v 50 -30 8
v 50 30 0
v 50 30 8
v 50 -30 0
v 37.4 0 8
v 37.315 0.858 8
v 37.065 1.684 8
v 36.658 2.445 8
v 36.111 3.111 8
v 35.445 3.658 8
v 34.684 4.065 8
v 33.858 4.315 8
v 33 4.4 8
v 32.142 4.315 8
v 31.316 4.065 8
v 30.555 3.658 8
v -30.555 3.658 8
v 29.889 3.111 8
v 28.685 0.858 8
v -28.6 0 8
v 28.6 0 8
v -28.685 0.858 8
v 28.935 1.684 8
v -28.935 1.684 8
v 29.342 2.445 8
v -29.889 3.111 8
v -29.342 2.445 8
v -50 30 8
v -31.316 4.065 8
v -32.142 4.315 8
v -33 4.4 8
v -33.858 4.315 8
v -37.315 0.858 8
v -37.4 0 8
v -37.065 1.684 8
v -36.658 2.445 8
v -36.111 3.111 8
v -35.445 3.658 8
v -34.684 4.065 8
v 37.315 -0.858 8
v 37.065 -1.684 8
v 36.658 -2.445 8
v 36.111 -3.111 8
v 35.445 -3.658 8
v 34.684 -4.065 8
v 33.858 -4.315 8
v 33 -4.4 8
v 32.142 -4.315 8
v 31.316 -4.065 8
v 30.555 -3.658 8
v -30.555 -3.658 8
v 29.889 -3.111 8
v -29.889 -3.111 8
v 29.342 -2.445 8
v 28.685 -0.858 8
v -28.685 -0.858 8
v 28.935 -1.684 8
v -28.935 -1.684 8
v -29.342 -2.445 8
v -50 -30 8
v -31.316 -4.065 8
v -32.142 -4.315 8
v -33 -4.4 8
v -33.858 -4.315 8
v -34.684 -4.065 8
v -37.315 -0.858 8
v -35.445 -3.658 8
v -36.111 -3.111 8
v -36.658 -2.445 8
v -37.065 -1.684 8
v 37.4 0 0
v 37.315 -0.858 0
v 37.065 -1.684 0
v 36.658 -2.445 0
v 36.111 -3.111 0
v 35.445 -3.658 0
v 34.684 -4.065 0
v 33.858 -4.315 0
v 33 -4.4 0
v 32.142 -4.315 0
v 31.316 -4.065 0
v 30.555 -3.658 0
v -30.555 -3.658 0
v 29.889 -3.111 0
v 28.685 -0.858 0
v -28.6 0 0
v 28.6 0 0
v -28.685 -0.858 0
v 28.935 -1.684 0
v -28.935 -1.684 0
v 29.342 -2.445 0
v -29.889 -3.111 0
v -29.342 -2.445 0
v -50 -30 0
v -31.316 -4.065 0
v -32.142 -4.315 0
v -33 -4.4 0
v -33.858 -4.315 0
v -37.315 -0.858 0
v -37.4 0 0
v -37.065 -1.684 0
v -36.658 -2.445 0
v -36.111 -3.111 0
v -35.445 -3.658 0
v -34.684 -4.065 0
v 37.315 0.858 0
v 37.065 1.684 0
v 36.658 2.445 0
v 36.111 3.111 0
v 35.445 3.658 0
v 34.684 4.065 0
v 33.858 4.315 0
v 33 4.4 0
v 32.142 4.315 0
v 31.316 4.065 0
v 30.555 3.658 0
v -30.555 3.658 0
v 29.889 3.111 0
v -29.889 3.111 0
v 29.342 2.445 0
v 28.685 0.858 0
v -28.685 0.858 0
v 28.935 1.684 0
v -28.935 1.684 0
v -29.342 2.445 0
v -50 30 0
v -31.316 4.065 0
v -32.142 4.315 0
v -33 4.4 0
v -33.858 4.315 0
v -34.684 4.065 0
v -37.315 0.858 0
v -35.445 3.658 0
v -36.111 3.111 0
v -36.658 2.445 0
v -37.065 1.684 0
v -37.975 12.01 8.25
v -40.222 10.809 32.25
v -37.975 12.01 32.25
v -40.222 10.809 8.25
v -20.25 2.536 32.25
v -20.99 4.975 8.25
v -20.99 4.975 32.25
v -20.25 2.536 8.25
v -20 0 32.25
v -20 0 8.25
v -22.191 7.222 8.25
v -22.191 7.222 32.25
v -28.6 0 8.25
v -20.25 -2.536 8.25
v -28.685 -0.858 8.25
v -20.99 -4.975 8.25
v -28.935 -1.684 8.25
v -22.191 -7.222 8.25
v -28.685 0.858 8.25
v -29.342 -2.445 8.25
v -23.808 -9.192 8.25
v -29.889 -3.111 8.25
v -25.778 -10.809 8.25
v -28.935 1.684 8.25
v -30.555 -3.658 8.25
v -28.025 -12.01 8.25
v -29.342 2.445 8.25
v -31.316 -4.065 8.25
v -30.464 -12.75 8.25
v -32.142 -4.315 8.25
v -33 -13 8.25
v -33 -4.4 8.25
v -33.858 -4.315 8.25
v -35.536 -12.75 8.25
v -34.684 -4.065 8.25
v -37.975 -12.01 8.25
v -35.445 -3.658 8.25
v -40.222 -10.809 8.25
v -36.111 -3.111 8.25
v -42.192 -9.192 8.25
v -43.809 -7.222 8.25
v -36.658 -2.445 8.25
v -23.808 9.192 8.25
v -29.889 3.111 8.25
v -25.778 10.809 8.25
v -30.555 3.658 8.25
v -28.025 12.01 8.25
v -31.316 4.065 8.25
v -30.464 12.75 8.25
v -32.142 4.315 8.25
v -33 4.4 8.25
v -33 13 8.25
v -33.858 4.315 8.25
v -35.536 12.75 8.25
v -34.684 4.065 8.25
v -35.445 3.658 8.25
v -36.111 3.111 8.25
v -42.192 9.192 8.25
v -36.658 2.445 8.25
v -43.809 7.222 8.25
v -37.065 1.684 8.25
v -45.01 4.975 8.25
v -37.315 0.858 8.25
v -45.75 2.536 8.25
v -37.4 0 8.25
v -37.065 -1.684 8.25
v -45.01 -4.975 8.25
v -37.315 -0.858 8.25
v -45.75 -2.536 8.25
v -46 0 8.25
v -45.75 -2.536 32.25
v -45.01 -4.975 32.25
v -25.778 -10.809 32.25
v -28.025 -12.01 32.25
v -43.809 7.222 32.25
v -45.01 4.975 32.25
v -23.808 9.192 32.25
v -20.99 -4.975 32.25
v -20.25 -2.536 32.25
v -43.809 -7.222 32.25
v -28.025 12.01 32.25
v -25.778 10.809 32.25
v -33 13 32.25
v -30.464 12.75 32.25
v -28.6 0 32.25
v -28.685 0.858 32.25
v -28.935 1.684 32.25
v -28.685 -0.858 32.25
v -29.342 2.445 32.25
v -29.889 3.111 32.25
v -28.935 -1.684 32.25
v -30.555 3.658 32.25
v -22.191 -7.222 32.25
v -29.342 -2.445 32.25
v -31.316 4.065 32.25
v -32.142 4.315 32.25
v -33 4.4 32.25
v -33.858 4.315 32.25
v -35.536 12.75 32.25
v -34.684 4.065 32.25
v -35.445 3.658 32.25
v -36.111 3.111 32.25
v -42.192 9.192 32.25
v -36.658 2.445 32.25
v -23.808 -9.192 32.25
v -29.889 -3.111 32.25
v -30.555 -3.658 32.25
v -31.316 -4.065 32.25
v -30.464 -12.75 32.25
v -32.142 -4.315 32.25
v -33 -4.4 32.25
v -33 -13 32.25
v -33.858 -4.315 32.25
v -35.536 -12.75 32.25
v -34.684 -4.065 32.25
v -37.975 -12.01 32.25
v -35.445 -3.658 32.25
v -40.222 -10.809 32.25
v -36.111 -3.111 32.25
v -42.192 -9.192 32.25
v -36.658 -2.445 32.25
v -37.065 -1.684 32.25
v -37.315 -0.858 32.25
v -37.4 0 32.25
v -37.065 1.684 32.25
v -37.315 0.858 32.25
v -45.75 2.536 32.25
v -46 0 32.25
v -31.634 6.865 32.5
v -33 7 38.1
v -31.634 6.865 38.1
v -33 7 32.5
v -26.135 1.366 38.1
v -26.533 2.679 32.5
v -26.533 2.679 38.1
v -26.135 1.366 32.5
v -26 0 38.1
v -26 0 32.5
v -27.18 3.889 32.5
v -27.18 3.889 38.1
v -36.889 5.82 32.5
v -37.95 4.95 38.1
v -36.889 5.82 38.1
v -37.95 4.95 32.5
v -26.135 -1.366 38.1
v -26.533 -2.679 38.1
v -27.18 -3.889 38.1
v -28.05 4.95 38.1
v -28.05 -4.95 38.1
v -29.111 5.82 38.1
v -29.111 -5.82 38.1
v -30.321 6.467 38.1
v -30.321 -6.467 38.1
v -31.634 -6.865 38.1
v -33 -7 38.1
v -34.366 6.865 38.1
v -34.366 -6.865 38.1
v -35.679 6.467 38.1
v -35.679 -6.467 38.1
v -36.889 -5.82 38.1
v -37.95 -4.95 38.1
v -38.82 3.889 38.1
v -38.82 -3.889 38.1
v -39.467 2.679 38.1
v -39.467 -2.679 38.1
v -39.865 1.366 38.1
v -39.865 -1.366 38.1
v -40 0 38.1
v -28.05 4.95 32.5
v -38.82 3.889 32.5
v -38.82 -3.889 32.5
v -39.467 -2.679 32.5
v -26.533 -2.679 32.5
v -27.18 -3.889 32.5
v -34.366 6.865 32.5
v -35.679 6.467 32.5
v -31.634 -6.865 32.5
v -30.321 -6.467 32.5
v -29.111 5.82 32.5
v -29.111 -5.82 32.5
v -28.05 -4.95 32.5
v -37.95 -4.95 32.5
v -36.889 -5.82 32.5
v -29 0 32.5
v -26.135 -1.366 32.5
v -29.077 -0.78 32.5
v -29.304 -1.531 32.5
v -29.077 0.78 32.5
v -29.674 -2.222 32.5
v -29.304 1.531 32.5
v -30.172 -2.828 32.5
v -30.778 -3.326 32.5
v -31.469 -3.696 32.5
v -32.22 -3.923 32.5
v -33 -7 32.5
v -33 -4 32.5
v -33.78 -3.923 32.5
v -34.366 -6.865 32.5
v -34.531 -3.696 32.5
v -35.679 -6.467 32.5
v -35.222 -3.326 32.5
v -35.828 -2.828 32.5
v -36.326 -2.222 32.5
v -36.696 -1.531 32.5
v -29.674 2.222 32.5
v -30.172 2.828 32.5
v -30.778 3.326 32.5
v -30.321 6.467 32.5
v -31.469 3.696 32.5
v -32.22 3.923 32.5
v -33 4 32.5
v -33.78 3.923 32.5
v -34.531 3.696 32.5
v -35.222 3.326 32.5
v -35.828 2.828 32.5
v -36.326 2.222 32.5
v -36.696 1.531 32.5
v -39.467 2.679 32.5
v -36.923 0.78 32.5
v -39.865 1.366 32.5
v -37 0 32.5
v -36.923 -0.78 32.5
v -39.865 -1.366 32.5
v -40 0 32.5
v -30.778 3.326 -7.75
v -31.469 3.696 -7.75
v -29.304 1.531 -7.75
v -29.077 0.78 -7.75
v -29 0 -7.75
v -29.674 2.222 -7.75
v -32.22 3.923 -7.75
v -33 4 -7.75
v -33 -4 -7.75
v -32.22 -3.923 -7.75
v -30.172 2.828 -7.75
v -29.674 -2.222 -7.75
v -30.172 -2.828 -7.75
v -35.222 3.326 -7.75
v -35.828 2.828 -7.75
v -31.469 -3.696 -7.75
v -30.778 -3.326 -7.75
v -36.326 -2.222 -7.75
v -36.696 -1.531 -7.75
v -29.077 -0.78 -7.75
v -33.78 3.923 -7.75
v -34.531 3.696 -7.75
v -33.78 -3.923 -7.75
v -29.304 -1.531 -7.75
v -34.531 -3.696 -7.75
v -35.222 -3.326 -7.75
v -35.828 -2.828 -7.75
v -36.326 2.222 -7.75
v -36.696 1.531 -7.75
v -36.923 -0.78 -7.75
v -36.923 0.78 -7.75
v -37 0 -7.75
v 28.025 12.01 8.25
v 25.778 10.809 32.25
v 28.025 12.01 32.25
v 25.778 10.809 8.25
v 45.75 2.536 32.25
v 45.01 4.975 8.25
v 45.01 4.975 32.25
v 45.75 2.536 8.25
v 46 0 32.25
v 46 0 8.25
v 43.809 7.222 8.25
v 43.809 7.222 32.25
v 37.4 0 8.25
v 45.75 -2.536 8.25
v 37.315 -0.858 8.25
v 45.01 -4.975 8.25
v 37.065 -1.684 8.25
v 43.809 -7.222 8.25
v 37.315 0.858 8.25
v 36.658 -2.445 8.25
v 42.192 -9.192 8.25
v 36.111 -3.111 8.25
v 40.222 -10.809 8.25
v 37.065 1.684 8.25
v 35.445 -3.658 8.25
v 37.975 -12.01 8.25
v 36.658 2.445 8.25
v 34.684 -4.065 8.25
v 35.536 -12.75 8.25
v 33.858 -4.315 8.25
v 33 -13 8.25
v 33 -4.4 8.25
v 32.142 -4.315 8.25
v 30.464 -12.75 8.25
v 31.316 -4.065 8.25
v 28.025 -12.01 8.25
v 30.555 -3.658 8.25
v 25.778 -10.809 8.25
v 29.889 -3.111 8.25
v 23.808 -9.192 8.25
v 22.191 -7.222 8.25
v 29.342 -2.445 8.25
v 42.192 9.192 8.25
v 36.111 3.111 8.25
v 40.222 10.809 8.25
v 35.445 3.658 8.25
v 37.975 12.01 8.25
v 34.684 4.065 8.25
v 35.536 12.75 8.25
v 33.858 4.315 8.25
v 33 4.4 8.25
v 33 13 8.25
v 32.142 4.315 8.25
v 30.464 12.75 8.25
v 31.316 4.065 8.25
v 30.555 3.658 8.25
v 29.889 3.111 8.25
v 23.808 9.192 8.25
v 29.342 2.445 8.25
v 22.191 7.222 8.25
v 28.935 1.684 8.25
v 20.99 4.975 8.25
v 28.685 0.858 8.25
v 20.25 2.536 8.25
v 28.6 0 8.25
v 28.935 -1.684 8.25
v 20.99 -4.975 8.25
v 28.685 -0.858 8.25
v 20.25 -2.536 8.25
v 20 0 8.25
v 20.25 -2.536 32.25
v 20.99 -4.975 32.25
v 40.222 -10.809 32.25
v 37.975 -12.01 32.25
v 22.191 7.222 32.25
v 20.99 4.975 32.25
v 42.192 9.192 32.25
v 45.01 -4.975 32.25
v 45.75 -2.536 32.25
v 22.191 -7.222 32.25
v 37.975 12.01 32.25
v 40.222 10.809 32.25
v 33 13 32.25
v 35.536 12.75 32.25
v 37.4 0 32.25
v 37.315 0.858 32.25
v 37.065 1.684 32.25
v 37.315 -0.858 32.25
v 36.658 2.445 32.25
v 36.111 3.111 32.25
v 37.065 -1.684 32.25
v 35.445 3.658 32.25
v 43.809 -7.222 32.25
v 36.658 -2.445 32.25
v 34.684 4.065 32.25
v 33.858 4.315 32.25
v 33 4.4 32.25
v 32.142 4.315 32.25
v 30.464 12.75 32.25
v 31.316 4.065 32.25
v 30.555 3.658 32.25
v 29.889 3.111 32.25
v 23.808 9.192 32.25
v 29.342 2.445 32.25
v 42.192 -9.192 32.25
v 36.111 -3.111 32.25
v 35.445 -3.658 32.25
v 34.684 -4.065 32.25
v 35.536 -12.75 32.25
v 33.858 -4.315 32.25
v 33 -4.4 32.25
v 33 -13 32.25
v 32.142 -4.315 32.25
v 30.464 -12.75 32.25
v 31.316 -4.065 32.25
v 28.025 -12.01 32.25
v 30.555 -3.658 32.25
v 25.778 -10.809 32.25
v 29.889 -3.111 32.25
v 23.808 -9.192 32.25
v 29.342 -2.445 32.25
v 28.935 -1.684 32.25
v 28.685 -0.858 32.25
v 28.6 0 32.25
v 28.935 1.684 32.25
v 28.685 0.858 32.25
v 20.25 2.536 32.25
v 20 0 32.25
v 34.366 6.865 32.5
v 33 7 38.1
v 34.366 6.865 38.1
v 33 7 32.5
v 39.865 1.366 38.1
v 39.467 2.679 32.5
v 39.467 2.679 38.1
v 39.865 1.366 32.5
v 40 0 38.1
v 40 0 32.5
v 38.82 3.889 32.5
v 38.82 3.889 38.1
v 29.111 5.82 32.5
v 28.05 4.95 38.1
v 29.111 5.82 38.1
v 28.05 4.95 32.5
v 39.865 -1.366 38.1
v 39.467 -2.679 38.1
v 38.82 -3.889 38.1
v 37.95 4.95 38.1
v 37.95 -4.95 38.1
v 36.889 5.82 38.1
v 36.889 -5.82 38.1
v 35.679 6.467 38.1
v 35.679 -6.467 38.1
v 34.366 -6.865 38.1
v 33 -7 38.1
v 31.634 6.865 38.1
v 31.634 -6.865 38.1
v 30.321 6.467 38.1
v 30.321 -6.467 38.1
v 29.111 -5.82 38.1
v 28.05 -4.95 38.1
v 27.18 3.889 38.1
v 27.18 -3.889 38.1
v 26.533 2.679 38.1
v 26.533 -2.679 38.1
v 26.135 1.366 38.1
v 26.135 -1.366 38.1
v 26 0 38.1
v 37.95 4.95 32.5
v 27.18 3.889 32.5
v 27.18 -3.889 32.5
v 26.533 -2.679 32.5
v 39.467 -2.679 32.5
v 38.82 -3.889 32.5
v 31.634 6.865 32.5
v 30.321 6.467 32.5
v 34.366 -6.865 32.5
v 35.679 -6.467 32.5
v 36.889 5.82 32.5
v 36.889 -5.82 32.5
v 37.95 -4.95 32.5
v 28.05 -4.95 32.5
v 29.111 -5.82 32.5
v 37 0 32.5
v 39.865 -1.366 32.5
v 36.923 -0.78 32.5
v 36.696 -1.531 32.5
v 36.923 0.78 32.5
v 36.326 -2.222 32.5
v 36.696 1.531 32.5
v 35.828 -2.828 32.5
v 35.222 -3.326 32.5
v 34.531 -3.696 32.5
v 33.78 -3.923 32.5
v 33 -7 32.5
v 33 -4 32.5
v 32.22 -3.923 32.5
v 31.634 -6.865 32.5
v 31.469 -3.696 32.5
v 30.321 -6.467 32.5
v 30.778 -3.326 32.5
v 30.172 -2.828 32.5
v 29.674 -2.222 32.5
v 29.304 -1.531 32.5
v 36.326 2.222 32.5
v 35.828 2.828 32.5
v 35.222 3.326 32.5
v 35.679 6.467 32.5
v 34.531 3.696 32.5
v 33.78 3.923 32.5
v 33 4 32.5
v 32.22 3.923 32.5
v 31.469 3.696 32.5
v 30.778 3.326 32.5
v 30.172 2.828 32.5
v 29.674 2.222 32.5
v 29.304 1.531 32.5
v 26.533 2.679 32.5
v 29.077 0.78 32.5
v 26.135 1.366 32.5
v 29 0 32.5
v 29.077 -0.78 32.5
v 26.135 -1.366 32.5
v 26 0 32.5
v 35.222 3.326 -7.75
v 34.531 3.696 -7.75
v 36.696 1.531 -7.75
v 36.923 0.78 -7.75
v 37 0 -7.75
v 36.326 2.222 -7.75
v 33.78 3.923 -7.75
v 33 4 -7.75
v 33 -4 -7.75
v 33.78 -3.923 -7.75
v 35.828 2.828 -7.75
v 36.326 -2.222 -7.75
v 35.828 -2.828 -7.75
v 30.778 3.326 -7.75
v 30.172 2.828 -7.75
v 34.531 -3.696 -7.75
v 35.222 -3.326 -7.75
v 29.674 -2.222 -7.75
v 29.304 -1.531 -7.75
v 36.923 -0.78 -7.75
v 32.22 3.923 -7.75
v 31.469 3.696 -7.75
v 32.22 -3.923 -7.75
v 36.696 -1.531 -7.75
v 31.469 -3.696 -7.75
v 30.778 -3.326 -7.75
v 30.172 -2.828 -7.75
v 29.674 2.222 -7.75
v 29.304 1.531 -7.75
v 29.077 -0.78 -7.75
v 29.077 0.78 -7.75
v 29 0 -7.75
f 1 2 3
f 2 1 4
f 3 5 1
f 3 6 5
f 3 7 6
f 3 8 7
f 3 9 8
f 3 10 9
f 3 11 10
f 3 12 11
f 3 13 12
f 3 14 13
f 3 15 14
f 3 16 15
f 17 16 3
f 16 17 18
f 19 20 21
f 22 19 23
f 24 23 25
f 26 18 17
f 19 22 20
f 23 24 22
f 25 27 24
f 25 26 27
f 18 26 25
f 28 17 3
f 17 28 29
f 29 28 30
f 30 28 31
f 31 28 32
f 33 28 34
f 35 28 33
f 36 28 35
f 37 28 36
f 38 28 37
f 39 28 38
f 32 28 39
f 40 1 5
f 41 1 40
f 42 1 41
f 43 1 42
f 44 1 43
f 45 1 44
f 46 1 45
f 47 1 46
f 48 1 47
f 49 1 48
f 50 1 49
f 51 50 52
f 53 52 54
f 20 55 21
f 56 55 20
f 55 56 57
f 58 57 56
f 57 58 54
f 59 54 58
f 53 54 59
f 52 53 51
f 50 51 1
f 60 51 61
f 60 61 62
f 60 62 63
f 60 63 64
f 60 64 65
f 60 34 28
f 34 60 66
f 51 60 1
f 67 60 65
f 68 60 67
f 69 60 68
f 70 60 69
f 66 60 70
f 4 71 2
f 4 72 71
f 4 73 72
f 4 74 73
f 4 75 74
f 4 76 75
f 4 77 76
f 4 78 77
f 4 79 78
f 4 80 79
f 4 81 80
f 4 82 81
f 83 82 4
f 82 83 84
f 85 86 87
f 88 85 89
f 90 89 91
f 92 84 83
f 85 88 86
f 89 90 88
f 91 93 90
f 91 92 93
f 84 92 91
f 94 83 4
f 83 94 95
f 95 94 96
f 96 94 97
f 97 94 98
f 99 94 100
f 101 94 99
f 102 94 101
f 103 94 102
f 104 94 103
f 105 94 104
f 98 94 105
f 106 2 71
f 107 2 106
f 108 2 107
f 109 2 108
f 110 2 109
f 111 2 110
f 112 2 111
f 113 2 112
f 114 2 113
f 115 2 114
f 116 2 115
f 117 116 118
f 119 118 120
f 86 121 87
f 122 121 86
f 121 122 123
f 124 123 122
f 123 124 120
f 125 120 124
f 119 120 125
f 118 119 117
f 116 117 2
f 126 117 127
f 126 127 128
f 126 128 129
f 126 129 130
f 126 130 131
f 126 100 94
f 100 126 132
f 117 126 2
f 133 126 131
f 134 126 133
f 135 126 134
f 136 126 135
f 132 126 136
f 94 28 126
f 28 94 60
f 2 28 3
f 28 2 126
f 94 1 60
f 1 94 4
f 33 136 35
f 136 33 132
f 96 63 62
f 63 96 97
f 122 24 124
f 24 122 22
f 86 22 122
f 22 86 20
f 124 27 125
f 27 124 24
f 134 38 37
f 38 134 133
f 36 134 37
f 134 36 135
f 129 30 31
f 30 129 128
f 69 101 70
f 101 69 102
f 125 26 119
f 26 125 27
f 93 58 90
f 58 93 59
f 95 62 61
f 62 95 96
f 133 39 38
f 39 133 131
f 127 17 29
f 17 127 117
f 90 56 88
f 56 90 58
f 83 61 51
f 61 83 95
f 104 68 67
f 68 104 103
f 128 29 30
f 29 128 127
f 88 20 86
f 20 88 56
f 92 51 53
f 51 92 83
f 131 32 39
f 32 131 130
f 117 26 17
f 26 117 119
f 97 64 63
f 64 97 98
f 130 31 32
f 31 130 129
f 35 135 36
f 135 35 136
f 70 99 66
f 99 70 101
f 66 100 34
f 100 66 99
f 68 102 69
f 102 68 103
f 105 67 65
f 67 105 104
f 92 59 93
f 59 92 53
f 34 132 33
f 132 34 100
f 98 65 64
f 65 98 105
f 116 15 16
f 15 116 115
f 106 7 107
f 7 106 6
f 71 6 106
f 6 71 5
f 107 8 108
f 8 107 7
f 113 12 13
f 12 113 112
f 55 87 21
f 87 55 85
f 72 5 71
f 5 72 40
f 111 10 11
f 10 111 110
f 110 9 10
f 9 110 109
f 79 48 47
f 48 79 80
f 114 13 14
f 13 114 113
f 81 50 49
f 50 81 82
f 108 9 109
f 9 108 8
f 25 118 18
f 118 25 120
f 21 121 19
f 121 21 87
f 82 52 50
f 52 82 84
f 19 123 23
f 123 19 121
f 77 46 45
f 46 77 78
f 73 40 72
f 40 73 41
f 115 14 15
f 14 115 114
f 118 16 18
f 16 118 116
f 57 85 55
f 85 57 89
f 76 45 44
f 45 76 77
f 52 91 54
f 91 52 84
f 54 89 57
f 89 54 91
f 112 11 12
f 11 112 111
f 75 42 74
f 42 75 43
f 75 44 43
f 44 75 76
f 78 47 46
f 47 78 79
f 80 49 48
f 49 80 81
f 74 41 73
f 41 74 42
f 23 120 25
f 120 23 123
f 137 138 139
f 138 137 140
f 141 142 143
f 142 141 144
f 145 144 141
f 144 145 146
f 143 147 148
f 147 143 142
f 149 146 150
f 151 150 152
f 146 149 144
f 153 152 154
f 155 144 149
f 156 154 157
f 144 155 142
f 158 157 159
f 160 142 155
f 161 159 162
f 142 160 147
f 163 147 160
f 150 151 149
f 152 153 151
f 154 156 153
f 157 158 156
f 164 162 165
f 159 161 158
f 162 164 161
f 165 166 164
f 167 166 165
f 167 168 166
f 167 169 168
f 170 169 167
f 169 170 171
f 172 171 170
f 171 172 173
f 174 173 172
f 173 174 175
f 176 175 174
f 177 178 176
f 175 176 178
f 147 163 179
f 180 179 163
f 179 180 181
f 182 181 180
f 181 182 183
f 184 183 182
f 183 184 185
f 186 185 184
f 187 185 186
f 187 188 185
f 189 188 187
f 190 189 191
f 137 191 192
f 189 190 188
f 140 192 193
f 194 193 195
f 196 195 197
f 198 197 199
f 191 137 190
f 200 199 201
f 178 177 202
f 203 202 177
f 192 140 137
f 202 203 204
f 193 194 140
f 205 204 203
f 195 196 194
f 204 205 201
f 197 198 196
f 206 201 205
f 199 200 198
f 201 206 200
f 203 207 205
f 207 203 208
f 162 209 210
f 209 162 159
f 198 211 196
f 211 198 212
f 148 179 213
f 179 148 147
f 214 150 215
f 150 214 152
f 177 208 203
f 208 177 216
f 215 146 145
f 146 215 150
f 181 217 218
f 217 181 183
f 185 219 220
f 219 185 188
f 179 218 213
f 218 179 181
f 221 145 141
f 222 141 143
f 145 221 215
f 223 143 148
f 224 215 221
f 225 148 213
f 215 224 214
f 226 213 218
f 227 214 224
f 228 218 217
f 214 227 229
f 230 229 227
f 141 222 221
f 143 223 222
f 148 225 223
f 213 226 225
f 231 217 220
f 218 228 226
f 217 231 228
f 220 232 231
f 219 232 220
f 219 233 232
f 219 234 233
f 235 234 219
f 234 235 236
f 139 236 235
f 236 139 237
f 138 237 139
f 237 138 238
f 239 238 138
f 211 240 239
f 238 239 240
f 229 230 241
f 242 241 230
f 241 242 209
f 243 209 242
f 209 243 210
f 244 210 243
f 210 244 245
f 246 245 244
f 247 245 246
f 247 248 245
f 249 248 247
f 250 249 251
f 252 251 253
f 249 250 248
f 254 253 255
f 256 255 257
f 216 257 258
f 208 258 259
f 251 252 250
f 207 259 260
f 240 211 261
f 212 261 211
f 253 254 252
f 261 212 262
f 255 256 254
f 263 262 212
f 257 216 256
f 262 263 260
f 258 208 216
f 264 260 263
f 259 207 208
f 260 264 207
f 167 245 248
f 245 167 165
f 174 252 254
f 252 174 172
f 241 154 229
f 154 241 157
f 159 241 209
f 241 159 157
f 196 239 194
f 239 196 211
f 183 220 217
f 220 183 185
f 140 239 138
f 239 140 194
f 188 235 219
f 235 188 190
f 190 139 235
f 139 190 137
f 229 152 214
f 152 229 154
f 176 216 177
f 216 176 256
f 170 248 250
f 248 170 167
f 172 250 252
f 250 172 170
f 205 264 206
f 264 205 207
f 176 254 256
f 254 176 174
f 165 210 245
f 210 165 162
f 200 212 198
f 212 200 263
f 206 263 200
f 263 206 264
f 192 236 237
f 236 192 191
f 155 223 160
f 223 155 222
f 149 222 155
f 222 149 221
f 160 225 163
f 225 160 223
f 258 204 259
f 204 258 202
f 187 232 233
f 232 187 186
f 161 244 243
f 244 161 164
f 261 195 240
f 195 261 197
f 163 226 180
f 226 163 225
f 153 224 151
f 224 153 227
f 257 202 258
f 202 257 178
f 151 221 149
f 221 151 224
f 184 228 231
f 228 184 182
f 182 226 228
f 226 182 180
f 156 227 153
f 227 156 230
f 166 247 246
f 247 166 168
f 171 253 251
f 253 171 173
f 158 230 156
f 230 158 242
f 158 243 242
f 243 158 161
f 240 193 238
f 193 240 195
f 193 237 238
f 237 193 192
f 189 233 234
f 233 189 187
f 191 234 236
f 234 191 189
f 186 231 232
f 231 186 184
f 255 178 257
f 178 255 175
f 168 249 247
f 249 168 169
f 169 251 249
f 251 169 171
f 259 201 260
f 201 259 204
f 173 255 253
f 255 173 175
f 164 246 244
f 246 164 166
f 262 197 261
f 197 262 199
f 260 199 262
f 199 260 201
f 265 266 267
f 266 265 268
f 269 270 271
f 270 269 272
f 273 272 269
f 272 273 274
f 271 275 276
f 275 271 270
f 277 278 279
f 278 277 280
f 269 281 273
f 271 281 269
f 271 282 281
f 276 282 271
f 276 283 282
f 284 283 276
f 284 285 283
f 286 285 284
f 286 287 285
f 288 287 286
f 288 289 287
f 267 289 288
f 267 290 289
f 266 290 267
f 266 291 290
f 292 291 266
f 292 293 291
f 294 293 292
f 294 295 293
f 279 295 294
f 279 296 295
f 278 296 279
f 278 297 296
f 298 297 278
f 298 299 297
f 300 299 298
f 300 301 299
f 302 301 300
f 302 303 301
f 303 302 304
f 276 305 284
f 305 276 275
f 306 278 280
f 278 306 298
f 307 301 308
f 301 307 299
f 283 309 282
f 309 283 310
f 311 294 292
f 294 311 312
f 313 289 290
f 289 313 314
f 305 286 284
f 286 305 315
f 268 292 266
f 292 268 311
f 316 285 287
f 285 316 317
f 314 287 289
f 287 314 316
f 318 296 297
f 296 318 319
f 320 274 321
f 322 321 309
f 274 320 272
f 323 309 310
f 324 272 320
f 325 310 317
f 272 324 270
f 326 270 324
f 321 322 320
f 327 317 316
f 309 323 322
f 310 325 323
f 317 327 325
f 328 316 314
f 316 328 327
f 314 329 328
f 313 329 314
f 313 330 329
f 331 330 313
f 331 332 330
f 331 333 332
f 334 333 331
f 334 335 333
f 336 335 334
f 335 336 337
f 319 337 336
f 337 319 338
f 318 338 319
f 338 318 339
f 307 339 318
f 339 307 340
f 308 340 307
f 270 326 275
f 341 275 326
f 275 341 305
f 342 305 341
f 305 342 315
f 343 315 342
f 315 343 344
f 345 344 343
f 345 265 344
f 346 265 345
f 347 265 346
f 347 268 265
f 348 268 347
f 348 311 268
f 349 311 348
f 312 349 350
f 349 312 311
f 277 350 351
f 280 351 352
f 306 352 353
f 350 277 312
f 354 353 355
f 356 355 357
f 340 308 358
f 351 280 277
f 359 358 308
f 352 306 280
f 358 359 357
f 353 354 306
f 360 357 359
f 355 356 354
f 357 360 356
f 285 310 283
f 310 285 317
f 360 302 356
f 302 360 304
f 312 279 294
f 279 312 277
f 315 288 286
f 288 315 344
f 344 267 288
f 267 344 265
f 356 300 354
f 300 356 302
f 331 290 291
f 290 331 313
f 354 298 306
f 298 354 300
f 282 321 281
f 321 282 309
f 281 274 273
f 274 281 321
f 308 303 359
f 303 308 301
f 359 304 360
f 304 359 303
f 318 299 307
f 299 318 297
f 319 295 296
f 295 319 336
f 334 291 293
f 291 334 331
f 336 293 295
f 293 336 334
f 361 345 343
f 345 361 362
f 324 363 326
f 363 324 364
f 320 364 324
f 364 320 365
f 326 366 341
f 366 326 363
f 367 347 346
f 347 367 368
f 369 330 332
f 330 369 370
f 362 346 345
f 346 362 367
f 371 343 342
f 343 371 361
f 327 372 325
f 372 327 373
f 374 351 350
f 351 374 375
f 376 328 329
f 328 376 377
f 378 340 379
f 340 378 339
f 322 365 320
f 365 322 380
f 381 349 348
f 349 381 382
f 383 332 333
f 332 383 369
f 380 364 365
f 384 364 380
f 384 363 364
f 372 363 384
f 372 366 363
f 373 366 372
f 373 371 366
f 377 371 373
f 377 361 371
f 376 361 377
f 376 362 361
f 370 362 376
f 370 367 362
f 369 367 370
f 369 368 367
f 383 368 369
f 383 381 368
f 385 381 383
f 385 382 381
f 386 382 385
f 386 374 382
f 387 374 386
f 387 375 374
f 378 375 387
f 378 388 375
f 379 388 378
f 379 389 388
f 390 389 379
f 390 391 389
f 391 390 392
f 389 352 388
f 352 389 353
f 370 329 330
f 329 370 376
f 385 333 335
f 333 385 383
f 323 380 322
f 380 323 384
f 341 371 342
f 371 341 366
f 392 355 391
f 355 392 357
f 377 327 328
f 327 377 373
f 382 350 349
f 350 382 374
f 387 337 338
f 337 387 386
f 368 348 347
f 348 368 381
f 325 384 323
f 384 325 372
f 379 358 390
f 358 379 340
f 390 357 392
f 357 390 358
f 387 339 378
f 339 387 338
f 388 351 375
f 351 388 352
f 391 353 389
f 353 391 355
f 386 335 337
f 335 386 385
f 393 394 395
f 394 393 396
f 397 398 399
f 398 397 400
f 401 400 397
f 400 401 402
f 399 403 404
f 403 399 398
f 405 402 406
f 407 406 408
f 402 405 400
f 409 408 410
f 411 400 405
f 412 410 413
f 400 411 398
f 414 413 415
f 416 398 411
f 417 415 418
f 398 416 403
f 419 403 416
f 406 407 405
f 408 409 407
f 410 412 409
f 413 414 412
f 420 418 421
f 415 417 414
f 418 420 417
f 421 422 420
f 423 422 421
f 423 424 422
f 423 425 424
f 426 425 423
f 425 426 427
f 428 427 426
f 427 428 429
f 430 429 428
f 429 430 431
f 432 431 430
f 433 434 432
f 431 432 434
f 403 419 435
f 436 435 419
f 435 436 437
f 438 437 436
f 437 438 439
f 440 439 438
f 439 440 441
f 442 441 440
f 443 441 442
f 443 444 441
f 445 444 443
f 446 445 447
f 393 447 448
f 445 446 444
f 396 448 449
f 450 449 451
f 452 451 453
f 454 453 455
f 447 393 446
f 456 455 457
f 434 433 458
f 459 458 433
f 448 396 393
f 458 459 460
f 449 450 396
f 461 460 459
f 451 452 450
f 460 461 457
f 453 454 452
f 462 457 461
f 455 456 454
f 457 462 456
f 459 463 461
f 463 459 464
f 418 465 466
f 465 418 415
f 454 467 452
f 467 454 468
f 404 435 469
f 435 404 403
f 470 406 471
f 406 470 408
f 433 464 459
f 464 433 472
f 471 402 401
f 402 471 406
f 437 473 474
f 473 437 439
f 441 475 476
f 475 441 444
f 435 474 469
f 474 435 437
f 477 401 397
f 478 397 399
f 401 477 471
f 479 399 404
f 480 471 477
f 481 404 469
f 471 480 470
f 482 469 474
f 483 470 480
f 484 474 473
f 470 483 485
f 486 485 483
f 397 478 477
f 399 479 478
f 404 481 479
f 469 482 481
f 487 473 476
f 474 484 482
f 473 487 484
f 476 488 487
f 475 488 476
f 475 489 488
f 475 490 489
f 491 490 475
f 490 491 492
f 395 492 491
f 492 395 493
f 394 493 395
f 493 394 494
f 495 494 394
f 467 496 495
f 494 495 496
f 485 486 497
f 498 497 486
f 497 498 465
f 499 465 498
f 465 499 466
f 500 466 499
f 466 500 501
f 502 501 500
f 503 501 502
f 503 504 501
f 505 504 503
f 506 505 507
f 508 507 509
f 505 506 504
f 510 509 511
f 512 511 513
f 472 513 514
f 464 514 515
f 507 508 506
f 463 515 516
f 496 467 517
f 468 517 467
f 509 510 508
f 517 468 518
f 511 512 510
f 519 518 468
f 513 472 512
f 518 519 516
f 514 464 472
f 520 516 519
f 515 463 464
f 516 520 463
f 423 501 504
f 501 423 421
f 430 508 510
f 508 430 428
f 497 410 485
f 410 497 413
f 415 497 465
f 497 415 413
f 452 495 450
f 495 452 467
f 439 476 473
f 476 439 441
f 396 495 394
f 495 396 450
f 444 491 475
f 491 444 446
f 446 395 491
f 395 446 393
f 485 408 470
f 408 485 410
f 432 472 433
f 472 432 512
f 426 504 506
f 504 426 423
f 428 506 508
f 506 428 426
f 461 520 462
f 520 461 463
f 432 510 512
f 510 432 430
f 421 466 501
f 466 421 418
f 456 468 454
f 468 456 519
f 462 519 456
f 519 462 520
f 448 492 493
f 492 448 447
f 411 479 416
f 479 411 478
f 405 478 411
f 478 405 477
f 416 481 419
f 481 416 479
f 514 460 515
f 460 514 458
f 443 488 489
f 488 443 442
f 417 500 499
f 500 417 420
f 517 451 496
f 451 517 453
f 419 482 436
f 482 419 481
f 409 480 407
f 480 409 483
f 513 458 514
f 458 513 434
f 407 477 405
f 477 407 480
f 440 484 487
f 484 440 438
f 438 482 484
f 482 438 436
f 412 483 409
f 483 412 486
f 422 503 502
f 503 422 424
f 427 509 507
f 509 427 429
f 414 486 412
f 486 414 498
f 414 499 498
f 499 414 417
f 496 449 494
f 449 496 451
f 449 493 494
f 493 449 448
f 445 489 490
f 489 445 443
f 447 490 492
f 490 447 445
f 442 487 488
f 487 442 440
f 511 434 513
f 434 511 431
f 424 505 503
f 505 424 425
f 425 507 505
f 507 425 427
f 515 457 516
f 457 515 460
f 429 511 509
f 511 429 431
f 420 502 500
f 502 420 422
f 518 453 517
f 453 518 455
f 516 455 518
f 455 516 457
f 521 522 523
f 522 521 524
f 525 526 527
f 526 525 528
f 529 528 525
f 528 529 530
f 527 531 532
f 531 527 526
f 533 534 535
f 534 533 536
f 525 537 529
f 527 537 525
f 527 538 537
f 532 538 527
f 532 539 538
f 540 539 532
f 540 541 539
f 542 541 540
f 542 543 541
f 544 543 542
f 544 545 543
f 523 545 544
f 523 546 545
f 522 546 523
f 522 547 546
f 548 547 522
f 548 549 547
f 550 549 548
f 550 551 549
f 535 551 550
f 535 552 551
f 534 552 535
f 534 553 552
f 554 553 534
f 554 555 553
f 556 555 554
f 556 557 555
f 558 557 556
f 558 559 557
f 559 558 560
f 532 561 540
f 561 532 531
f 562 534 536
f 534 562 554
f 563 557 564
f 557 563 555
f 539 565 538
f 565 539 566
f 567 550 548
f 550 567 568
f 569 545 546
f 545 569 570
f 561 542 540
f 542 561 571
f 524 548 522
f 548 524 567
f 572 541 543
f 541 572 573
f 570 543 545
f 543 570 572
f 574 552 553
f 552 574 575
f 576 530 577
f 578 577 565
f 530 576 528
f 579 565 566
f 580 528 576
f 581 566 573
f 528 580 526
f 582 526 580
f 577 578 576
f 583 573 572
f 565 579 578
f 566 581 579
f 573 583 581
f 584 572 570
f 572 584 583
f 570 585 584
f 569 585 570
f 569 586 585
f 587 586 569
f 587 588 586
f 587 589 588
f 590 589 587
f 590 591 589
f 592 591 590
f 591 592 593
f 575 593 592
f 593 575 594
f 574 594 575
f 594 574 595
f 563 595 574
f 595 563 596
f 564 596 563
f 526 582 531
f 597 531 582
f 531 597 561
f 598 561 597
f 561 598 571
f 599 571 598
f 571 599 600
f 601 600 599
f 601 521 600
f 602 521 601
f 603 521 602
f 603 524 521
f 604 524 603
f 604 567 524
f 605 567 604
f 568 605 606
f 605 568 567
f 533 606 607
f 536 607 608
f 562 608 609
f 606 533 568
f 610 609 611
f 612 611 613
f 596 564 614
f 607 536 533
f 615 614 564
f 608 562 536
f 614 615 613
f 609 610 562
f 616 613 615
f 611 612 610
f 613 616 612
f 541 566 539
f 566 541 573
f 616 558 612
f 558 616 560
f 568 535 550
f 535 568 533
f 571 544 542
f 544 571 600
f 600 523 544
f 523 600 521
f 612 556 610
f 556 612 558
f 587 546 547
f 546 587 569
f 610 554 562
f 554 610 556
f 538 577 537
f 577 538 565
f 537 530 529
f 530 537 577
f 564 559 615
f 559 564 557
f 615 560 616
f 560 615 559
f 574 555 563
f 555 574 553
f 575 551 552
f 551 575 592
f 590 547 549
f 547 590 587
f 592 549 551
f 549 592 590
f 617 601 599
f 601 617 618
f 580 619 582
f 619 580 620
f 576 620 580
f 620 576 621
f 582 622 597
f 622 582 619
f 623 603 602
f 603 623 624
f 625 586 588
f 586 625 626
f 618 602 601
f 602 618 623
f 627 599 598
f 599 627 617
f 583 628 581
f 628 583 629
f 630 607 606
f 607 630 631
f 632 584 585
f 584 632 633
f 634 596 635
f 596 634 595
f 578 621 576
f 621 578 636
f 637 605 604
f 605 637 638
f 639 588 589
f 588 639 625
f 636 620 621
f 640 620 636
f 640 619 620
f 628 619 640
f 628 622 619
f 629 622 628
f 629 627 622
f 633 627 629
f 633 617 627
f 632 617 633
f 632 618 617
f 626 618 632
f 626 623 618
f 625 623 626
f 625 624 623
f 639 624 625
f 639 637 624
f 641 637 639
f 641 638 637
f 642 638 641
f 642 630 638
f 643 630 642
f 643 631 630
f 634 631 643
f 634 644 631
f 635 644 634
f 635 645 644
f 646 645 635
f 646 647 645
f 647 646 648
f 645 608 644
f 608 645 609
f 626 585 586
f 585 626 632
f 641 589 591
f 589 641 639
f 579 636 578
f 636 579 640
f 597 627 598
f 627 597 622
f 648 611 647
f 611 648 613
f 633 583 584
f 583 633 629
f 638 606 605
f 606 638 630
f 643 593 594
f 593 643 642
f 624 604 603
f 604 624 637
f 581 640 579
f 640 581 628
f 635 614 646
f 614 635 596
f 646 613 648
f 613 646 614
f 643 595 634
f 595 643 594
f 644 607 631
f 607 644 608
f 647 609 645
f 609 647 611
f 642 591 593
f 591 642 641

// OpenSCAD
$fn = 32;

// ------------------------------------------------------------------------
// Standoff columns: 2 d26 standoffs, bolts d8
// Every part is its own module, assembly() places them once.
// ------------------------------------------------------------------------

// --- part 1 ---
module base_plate() {
  difference() {
    translate([-50, -30, 0]) cube([100, 60, 8]);
    translate([-33, 0, -1]) cylinder(h = 10, d = 8.8);
    translate([33, 0, -1]) cylinder(h = 10, d = 8.8);
  }
}

// --- part 2 ---
module spacer1() {
  difference() {
      translate([0, 0, 0]) cylinder(h = 24, d = 26);
      translate([0, 0, -1]) cylinder(h = 26, d = 8.8);
    }
}

// --- part 3 ---
module bolt1() {
  cylinder(h = 5.6, d = 14);
  translate([0, 0, -40.25]) cylinder(h = 40.25, d = 8);
}

// --- part 4 ---
module spacer2() {
  difference() {
      translate([0, 0, 0]) cylinder(h = 24, d = 26);
      translate([0, 0, -1]) cylinder(h = 26, d = 8.8);
    }
}

// --- part 5 ---
module bolt2() {
  cylinder(h = 5.6, d = 14);
  translate([0, 0, -40.25]) cylinder(h = 40.25, d = 8);
}

// --- assembly ---
module assembly() {
  translate([0, 0, 0]) rotate([0, 0, 0]) base_plate();
  translate([-33, 0, 8.25]) rotate([0, 0, 0]) spacer1();
  translate([-33, 0, 32.5]) rotate([0, 0, 0]) bolt1();
  translate([33, 0, 8.25]) rotate([0, 0, 0]) spacer2();
  translate([33, 0, 32.5]) rotate([0, 0, 0]) bolt2();
}

assembly();
